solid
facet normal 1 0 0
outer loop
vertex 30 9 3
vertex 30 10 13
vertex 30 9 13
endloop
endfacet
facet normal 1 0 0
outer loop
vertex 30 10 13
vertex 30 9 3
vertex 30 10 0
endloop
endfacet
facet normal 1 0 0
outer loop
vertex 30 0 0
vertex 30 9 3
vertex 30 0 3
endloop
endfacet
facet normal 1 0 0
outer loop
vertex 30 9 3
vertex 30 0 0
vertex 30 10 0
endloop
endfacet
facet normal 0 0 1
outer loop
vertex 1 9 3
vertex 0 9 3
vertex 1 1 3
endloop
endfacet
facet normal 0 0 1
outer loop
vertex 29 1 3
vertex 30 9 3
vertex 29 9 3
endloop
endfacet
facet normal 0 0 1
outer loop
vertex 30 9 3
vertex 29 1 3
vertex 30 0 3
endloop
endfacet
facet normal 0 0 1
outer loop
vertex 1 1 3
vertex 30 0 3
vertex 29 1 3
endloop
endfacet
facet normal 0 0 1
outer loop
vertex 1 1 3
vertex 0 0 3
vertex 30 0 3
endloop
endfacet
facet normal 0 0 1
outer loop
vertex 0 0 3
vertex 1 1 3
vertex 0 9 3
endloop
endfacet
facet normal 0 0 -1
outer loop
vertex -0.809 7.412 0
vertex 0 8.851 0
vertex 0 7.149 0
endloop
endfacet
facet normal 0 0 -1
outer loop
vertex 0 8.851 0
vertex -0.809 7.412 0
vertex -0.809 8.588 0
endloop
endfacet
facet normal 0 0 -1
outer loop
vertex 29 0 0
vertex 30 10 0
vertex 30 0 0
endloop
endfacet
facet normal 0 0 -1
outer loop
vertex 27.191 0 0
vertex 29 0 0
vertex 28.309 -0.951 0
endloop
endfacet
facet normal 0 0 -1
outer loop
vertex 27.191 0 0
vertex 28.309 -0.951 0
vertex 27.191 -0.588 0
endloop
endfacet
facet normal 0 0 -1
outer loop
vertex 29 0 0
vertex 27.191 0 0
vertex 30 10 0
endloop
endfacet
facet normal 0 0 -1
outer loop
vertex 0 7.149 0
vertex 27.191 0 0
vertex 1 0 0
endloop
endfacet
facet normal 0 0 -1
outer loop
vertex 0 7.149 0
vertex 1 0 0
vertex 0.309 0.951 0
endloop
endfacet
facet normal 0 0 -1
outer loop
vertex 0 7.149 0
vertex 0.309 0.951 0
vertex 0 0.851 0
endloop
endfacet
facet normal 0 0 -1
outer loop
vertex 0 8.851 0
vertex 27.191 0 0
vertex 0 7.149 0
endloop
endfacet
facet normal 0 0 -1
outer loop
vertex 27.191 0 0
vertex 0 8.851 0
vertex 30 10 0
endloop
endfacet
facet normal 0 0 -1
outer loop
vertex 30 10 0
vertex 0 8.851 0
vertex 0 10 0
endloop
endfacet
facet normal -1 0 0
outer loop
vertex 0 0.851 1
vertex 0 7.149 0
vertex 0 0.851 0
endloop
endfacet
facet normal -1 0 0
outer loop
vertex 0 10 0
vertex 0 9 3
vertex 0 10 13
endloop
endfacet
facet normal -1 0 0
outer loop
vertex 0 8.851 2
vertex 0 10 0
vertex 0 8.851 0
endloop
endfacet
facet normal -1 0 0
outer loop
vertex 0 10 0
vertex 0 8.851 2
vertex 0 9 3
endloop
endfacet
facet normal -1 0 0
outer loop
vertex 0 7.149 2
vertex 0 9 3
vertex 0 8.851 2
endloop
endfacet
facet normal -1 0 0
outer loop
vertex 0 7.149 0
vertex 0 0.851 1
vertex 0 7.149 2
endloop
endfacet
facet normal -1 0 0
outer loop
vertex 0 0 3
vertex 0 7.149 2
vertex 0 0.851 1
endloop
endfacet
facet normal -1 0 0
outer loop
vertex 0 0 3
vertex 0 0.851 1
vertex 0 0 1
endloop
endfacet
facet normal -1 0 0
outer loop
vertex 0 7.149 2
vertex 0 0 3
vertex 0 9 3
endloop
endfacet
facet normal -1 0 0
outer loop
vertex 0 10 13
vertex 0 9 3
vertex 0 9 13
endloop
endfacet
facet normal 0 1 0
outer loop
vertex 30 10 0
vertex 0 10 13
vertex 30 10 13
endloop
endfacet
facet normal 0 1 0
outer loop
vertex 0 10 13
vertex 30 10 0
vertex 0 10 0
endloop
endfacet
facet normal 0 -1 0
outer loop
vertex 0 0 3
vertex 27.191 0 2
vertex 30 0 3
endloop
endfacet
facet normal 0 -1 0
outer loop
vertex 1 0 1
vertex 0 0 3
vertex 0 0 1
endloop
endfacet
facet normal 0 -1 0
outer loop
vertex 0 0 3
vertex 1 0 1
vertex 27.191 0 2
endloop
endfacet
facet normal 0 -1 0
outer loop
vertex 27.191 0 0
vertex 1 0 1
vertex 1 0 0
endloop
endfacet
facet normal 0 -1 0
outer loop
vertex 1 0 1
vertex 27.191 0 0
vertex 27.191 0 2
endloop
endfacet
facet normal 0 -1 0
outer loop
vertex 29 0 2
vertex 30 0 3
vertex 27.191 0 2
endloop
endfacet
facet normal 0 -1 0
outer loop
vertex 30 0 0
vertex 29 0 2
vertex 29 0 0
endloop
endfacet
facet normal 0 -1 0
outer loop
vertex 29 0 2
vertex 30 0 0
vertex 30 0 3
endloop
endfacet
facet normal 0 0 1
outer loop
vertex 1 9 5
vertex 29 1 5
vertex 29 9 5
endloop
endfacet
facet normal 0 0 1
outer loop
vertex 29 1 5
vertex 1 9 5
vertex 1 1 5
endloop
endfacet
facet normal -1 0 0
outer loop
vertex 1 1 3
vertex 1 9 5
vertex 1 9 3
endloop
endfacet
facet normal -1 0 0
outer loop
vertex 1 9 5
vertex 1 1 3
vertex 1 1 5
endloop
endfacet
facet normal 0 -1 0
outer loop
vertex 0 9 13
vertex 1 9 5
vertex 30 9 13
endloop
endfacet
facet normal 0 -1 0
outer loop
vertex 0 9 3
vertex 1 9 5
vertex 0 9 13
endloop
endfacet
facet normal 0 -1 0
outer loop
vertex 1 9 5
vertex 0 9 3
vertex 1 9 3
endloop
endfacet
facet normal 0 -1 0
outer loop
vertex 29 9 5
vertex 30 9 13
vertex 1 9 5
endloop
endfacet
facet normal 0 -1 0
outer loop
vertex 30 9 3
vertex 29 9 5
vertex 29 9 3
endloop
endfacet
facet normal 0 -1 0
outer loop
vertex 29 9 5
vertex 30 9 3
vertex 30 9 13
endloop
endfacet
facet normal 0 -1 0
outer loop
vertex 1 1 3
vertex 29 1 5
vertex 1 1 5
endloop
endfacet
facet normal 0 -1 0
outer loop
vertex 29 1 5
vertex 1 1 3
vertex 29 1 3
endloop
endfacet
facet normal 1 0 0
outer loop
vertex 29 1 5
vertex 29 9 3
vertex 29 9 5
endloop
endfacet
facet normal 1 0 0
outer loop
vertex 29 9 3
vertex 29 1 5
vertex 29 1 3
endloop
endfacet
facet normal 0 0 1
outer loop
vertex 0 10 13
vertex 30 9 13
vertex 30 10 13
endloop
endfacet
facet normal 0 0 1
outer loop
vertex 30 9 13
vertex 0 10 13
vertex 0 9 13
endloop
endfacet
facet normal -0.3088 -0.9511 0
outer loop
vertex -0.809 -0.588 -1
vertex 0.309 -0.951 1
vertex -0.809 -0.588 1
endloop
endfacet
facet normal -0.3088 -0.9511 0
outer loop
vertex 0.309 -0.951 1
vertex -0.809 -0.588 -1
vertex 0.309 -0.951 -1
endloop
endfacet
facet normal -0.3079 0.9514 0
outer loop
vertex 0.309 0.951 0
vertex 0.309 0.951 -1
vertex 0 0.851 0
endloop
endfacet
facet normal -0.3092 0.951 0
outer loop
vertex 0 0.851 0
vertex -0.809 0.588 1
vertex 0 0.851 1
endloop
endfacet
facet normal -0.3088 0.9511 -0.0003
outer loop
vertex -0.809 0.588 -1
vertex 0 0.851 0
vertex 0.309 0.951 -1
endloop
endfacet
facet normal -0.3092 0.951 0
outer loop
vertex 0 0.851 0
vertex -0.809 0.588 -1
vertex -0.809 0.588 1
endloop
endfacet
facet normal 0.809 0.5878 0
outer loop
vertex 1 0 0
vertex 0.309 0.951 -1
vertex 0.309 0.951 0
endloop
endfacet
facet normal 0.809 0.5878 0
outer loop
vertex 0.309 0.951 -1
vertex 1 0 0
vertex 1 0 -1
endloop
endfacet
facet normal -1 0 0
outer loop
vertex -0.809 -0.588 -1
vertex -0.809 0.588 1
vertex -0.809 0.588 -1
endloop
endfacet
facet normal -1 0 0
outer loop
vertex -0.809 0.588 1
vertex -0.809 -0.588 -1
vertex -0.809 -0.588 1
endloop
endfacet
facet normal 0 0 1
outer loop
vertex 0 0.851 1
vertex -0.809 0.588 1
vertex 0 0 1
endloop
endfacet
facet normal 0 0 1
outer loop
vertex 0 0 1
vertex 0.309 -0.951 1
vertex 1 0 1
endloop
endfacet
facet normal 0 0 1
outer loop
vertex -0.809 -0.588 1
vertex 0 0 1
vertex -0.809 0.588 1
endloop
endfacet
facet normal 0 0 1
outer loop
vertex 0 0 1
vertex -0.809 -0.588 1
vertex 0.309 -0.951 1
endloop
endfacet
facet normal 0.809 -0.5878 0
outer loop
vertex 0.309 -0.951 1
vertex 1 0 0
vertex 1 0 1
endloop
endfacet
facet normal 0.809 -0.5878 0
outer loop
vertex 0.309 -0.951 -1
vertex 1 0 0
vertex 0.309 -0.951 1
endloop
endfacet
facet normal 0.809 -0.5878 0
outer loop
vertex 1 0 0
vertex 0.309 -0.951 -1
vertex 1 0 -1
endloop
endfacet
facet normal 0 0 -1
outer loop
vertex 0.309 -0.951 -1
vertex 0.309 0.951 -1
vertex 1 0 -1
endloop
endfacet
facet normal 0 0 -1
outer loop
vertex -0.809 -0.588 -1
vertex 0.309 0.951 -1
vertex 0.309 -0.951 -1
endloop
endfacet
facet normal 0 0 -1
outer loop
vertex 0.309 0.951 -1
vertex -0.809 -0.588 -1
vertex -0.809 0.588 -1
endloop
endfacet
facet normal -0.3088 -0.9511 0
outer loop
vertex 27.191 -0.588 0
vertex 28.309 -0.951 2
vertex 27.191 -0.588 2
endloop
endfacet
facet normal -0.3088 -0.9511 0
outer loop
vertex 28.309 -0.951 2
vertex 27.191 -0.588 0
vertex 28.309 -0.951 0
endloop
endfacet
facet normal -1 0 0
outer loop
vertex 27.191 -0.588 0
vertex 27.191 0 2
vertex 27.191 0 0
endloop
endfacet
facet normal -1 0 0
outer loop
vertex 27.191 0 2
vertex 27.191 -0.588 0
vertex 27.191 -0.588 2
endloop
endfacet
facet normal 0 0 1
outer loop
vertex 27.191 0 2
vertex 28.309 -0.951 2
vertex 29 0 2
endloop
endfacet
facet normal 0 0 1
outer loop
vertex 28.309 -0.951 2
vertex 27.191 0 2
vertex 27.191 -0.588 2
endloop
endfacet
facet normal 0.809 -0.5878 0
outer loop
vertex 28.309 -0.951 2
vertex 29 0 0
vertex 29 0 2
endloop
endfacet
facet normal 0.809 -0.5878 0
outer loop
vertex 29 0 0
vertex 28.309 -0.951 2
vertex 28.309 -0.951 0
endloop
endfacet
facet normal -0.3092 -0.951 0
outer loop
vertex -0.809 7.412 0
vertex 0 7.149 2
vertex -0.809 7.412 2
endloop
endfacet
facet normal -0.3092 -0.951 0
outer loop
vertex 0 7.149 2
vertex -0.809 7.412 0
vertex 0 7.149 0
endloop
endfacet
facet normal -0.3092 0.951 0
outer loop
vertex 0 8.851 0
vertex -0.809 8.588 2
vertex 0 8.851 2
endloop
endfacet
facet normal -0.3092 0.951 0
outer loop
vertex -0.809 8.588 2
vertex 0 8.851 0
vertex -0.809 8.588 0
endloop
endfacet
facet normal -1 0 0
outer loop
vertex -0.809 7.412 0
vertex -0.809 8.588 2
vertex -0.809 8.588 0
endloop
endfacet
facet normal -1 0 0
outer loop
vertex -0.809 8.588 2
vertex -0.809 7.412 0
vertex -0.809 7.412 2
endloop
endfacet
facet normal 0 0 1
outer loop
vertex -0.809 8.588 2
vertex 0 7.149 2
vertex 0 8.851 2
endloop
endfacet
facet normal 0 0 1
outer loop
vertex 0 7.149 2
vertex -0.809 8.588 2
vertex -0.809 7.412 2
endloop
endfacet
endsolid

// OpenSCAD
// Base of the couch
translate([0, 0, 0])
cube([30, 10, 3]);

// Cushions
translate([1, 1, 3])
cube([10, 8, 2]);
translate([11, 1, 3])
cube([10, 8, 2]);
translate([21, 1, 3])
cube([8, 8, 2]);

// Backrest
translate([0, 9, 3])
cube([30, 1, 10]);

// Legs (small cylinders used as couch legs)
cylinder(h = 2, r = 1, center = true);
translate([28, 0, 1])
cylinder(h = 2, r = 1, center = true);
translate([28, 8, 1])
cylinder(h = 2, r = 1, center = true);
translate([0, 8, 1])
cylinder(h = 2, r = 1, center = true);
